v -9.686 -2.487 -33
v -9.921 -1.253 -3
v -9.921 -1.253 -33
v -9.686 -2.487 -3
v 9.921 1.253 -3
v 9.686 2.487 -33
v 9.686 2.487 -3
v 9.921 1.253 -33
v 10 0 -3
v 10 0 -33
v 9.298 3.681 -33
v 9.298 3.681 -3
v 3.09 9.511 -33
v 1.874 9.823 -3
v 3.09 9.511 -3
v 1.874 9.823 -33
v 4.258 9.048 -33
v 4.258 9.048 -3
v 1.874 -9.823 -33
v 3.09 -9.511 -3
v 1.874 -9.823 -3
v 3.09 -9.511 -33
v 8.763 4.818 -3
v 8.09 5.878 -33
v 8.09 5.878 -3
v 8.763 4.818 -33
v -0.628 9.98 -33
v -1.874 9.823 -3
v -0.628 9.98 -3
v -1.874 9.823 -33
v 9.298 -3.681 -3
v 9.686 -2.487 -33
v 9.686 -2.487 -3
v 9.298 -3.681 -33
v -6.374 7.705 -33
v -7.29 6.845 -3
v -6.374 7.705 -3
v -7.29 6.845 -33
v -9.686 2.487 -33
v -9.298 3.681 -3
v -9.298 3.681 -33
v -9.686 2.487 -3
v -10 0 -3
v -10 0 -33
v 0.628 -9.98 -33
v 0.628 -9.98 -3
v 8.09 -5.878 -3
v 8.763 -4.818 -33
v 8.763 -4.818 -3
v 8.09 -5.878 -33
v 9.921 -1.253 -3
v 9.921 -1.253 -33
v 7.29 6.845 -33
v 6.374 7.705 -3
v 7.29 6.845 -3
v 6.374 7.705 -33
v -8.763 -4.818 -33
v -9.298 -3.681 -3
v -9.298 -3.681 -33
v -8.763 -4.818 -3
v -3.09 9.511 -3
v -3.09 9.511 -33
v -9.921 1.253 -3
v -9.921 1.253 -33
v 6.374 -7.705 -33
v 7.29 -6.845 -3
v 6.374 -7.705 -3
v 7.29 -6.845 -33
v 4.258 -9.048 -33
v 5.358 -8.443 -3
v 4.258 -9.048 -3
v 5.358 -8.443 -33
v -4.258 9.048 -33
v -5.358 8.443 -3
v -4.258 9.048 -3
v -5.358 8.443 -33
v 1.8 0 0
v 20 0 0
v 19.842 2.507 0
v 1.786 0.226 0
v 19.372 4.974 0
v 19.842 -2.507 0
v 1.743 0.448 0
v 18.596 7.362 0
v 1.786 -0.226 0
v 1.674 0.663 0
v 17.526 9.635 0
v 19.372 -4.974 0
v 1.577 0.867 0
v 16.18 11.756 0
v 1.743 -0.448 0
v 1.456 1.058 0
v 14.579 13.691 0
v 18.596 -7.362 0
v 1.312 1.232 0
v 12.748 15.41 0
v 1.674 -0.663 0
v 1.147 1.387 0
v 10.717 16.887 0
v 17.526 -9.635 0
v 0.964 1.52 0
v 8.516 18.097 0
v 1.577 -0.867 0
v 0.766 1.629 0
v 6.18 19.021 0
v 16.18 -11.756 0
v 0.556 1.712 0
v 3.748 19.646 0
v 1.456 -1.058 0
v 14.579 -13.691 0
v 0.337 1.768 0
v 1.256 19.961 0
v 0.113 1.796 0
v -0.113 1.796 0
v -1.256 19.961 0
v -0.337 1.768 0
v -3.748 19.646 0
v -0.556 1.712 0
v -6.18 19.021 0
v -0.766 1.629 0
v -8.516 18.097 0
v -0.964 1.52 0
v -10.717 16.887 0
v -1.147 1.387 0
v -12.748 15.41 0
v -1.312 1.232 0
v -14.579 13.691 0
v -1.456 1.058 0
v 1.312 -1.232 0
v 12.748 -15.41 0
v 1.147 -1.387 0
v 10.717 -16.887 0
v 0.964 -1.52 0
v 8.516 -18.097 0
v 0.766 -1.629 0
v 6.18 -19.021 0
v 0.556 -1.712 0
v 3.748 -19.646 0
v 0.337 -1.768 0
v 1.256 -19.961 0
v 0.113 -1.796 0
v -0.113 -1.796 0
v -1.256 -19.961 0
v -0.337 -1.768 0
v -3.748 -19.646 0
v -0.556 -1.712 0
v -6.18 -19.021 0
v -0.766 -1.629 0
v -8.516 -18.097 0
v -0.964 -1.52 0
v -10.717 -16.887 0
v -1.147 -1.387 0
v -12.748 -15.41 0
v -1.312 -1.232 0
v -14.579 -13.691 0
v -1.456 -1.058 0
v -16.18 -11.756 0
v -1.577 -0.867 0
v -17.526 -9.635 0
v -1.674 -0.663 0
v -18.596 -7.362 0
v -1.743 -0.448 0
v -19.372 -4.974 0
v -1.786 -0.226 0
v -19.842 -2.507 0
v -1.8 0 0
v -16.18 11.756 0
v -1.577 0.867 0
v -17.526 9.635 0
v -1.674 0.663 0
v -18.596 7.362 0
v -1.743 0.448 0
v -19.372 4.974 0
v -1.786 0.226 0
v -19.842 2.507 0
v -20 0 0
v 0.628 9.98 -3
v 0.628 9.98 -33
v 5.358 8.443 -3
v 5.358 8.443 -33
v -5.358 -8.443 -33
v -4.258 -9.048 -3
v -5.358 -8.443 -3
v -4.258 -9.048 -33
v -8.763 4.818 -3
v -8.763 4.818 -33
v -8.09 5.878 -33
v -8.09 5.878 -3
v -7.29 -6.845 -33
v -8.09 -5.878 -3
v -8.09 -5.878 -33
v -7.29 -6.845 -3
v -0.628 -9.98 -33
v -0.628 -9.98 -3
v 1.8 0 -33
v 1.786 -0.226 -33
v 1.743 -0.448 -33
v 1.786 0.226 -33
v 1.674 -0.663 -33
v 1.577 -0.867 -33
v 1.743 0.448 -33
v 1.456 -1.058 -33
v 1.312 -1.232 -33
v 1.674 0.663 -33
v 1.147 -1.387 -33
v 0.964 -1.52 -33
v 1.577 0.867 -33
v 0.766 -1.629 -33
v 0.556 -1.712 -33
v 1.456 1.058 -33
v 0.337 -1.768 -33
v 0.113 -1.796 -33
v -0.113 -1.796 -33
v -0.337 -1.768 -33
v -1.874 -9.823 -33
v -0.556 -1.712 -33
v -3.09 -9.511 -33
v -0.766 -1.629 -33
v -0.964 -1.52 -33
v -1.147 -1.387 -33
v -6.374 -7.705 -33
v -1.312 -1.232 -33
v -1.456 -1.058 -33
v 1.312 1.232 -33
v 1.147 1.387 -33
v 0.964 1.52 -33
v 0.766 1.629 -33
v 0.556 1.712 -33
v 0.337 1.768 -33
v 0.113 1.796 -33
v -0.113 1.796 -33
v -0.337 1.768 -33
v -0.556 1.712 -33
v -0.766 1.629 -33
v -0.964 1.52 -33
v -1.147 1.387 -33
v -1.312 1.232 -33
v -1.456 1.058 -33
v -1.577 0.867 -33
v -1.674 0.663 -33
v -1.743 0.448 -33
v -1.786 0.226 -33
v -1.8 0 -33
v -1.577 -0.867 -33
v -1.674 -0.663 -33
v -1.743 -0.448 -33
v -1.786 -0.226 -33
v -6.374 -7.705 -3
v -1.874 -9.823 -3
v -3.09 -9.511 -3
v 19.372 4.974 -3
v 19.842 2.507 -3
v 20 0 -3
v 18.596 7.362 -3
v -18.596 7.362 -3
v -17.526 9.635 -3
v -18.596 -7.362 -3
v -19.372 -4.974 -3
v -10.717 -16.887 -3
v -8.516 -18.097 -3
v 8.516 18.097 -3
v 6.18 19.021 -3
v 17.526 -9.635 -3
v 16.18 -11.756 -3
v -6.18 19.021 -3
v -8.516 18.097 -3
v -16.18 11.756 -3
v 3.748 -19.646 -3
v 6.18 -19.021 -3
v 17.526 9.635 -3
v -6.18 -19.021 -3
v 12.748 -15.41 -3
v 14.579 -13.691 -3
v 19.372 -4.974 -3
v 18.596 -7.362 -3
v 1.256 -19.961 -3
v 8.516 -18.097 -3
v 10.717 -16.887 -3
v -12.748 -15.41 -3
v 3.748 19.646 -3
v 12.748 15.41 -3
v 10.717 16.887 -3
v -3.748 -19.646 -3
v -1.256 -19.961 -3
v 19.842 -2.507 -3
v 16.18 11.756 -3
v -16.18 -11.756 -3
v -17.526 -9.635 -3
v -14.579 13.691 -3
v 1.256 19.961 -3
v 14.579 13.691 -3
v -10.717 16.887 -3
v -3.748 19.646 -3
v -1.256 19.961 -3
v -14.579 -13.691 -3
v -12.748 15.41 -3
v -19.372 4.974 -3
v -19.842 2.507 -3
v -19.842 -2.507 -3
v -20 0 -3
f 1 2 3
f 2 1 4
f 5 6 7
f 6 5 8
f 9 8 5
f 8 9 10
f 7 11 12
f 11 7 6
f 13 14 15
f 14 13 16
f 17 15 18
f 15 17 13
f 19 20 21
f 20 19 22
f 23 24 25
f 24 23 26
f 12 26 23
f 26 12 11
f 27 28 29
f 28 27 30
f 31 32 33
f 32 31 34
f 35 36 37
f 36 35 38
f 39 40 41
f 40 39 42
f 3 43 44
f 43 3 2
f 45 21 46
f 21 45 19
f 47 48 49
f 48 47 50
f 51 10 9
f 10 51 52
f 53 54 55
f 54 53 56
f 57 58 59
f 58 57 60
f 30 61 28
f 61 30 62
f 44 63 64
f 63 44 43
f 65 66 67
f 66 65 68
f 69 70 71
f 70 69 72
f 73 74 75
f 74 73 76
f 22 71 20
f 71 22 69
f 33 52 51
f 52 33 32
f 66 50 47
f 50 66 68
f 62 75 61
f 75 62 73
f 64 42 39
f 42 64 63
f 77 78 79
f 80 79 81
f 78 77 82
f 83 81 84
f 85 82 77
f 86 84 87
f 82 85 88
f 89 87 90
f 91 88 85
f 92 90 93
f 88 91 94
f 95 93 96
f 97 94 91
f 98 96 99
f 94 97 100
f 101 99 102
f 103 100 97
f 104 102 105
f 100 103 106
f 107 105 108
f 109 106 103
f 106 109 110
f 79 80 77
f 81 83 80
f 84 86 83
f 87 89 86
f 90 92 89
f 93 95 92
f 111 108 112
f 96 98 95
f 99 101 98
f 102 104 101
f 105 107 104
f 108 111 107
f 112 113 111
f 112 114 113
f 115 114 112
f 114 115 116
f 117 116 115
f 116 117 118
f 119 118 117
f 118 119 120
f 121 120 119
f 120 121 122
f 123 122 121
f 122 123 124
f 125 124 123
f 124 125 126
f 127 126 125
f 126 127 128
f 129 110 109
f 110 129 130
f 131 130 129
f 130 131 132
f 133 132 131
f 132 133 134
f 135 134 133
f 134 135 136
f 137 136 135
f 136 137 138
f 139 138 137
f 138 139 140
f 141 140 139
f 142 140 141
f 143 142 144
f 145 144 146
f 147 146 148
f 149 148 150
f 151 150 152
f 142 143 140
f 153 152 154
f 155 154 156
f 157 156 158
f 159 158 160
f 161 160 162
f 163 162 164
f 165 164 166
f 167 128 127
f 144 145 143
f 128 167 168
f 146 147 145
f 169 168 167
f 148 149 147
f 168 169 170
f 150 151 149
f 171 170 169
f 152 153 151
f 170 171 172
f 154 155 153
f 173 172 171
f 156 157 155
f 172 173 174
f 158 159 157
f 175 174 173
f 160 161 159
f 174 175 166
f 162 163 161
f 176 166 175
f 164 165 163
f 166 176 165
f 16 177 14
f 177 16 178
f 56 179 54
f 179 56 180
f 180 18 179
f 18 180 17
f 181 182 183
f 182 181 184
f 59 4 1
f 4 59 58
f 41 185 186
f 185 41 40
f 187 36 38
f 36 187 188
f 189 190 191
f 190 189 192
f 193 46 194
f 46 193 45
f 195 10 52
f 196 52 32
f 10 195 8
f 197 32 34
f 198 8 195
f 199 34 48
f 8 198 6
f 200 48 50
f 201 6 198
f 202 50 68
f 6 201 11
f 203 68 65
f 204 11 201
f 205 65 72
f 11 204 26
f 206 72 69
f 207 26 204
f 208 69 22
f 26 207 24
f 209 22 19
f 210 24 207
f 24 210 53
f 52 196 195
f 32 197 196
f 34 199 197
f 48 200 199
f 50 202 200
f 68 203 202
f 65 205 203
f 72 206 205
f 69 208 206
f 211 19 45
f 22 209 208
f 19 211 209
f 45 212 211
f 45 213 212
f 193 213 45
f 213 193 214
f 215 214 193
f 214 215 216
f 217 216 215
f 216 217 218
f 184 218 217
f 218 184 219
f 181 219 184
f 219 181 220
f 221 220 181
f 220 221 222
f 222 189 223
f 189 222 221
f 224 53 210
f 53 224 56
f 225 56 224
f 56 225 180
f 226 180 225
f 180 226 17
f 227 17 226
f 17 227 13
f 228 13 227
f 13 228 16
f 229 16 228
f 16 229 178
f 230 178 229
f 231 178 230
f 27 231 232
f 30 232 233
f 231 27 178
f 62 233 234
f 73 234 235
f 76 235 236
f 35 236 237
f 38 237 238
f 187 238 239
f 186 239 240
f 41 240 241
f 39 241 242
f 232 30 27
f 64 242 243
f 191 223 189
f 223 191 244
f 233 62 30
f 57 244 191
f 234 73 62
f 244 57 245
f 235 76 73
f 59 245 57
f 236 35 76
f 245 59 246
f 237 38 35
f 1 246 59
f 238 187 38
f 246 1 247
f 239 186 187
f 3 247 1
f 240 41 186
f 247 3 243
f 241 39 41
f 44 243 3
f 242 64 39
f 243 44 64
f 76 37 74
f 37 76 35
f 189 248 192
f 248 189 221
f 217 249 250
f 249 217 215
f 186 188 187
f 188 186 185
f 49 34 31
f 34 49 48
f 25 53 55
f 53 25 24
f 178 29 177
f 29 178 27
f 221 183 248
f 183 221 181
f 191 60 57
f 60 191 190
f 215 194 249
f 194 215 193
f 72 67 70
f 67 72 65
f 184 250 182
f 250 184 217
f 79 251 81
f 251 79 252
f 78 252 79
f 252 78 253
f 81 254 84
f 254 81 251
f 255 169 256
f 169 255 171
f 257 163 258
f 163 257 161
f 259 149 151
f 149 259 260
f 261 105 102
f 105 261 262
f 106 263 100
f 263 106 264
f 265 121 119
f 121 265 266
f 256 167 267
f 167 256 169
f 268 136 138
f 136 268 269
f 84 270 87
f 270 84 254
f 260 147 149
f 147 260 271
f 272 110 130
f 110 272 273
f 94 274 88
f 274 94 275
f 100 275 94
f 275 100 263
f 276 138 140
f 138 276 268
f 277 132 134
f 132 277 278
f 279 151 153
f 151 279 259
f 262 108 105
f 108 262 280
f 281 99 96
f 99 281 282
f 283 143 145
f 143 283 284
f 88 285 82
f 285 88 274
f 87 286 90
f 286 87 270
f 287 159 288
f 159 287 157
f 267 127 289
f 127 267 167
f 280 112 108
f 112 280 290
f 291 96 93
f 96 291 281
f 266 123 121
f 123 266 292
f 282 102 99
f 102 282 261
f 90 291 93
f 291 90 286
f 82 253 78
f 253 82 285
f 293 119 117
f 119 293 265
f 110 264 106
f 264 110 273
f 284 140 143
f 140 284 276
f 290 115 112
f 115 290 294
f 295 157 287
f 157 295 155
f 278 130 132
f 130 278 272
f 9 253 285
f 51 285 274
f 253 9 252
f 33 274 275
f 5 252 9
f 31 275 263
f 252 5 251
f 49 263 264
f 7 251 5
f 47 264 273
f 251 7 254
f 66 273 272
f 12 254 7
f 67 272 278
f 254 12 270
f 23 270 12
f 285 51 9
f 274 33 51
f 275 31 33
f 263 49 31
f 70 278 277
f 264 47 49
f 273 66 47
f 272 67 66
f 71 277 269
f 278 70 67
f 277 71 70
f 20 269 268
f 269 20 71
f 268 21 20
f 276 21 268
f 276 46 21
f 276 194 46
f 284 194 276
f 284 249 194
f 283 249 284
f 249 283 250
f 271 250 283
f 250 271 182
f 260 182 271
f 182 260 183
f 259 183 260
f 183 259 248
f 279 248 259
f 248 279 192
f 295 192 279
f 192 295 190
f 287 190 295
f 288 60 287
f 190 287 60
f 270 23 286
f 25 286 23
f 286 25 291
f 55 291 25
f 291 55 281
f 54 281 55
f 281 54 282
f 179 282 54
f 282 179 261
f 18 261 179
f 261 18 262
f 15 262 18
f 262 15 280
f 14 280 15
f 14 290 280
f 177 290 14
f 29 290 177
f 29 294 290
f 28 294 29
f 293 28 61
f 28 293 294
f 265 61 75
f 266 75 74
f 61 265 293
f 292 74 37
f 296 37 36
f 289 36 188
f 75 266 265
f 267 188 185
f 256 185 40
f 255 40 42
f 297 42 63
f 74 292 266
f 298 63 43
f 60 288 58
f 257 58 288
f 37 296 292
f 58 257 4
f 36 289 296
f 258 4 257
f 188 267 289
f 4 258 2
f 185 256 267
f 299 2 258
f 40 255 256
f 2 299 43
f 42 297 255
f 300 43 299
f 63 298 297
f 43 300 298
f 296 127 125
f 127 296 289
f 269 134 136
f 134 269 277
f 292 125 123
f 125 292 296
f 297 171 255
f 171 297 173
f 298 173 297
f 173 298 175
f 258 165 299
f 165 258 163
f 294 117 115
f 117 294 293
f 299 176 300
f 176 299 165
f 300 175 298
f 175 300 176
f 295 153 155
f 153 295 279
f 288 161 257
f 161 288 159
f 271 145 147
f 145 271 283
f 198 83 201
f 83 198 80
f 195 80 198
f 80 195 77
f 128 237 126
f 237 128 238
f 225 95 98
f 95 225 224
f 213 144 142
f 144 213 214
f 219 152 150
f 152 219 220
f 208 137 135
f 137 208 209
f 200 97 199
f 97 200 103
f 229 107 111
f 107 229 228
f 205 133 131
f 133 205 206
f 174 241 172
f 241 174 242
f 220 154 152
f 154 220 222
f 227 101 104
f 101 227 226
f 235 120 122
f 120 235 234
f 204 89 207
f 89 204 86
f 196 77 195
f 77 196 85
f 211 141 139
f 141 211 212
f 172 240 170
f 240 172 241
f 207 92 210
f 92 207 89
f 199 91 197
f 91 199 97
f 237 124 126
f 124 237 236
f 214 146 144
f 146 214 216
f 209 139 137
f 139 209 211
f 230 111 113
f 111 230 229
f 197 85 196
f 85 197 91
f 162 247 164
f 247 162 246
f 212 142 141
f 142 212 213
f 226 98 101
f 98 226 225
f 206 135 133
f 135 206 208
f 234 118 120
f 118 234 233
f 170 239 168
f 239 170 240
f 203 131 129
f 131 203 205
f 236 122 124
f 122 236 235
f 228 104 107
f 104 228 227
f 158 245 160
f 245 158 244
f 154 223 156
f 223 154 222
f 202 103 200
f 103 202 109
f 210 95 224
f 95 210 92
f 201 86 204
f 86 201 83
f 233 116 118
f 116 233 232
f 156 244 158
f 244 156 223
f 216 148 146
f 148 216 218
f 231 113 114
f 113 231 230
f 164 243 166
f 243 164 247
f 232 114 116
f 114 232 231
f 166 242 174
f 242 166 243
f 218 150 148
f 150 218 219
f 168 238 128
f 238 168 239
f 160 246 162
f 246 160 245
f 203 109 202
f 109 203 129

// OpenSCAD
$fn = 50;


difference() {
	union() {
		translate(v = [0, 0, -33.0000000000]) {
			cylinder(h = 33, r = 10.0000000000);
		}
		translate(v = [0, 0, -3.0000000000]) {
			cylinder(h = 3, r = 20.0000000000);
		}
	}
	union() {
		#translate(v = [0, 0, -33]) {
			cylinder(h = 33, r = 1.8000000000);
		}
	}
}
